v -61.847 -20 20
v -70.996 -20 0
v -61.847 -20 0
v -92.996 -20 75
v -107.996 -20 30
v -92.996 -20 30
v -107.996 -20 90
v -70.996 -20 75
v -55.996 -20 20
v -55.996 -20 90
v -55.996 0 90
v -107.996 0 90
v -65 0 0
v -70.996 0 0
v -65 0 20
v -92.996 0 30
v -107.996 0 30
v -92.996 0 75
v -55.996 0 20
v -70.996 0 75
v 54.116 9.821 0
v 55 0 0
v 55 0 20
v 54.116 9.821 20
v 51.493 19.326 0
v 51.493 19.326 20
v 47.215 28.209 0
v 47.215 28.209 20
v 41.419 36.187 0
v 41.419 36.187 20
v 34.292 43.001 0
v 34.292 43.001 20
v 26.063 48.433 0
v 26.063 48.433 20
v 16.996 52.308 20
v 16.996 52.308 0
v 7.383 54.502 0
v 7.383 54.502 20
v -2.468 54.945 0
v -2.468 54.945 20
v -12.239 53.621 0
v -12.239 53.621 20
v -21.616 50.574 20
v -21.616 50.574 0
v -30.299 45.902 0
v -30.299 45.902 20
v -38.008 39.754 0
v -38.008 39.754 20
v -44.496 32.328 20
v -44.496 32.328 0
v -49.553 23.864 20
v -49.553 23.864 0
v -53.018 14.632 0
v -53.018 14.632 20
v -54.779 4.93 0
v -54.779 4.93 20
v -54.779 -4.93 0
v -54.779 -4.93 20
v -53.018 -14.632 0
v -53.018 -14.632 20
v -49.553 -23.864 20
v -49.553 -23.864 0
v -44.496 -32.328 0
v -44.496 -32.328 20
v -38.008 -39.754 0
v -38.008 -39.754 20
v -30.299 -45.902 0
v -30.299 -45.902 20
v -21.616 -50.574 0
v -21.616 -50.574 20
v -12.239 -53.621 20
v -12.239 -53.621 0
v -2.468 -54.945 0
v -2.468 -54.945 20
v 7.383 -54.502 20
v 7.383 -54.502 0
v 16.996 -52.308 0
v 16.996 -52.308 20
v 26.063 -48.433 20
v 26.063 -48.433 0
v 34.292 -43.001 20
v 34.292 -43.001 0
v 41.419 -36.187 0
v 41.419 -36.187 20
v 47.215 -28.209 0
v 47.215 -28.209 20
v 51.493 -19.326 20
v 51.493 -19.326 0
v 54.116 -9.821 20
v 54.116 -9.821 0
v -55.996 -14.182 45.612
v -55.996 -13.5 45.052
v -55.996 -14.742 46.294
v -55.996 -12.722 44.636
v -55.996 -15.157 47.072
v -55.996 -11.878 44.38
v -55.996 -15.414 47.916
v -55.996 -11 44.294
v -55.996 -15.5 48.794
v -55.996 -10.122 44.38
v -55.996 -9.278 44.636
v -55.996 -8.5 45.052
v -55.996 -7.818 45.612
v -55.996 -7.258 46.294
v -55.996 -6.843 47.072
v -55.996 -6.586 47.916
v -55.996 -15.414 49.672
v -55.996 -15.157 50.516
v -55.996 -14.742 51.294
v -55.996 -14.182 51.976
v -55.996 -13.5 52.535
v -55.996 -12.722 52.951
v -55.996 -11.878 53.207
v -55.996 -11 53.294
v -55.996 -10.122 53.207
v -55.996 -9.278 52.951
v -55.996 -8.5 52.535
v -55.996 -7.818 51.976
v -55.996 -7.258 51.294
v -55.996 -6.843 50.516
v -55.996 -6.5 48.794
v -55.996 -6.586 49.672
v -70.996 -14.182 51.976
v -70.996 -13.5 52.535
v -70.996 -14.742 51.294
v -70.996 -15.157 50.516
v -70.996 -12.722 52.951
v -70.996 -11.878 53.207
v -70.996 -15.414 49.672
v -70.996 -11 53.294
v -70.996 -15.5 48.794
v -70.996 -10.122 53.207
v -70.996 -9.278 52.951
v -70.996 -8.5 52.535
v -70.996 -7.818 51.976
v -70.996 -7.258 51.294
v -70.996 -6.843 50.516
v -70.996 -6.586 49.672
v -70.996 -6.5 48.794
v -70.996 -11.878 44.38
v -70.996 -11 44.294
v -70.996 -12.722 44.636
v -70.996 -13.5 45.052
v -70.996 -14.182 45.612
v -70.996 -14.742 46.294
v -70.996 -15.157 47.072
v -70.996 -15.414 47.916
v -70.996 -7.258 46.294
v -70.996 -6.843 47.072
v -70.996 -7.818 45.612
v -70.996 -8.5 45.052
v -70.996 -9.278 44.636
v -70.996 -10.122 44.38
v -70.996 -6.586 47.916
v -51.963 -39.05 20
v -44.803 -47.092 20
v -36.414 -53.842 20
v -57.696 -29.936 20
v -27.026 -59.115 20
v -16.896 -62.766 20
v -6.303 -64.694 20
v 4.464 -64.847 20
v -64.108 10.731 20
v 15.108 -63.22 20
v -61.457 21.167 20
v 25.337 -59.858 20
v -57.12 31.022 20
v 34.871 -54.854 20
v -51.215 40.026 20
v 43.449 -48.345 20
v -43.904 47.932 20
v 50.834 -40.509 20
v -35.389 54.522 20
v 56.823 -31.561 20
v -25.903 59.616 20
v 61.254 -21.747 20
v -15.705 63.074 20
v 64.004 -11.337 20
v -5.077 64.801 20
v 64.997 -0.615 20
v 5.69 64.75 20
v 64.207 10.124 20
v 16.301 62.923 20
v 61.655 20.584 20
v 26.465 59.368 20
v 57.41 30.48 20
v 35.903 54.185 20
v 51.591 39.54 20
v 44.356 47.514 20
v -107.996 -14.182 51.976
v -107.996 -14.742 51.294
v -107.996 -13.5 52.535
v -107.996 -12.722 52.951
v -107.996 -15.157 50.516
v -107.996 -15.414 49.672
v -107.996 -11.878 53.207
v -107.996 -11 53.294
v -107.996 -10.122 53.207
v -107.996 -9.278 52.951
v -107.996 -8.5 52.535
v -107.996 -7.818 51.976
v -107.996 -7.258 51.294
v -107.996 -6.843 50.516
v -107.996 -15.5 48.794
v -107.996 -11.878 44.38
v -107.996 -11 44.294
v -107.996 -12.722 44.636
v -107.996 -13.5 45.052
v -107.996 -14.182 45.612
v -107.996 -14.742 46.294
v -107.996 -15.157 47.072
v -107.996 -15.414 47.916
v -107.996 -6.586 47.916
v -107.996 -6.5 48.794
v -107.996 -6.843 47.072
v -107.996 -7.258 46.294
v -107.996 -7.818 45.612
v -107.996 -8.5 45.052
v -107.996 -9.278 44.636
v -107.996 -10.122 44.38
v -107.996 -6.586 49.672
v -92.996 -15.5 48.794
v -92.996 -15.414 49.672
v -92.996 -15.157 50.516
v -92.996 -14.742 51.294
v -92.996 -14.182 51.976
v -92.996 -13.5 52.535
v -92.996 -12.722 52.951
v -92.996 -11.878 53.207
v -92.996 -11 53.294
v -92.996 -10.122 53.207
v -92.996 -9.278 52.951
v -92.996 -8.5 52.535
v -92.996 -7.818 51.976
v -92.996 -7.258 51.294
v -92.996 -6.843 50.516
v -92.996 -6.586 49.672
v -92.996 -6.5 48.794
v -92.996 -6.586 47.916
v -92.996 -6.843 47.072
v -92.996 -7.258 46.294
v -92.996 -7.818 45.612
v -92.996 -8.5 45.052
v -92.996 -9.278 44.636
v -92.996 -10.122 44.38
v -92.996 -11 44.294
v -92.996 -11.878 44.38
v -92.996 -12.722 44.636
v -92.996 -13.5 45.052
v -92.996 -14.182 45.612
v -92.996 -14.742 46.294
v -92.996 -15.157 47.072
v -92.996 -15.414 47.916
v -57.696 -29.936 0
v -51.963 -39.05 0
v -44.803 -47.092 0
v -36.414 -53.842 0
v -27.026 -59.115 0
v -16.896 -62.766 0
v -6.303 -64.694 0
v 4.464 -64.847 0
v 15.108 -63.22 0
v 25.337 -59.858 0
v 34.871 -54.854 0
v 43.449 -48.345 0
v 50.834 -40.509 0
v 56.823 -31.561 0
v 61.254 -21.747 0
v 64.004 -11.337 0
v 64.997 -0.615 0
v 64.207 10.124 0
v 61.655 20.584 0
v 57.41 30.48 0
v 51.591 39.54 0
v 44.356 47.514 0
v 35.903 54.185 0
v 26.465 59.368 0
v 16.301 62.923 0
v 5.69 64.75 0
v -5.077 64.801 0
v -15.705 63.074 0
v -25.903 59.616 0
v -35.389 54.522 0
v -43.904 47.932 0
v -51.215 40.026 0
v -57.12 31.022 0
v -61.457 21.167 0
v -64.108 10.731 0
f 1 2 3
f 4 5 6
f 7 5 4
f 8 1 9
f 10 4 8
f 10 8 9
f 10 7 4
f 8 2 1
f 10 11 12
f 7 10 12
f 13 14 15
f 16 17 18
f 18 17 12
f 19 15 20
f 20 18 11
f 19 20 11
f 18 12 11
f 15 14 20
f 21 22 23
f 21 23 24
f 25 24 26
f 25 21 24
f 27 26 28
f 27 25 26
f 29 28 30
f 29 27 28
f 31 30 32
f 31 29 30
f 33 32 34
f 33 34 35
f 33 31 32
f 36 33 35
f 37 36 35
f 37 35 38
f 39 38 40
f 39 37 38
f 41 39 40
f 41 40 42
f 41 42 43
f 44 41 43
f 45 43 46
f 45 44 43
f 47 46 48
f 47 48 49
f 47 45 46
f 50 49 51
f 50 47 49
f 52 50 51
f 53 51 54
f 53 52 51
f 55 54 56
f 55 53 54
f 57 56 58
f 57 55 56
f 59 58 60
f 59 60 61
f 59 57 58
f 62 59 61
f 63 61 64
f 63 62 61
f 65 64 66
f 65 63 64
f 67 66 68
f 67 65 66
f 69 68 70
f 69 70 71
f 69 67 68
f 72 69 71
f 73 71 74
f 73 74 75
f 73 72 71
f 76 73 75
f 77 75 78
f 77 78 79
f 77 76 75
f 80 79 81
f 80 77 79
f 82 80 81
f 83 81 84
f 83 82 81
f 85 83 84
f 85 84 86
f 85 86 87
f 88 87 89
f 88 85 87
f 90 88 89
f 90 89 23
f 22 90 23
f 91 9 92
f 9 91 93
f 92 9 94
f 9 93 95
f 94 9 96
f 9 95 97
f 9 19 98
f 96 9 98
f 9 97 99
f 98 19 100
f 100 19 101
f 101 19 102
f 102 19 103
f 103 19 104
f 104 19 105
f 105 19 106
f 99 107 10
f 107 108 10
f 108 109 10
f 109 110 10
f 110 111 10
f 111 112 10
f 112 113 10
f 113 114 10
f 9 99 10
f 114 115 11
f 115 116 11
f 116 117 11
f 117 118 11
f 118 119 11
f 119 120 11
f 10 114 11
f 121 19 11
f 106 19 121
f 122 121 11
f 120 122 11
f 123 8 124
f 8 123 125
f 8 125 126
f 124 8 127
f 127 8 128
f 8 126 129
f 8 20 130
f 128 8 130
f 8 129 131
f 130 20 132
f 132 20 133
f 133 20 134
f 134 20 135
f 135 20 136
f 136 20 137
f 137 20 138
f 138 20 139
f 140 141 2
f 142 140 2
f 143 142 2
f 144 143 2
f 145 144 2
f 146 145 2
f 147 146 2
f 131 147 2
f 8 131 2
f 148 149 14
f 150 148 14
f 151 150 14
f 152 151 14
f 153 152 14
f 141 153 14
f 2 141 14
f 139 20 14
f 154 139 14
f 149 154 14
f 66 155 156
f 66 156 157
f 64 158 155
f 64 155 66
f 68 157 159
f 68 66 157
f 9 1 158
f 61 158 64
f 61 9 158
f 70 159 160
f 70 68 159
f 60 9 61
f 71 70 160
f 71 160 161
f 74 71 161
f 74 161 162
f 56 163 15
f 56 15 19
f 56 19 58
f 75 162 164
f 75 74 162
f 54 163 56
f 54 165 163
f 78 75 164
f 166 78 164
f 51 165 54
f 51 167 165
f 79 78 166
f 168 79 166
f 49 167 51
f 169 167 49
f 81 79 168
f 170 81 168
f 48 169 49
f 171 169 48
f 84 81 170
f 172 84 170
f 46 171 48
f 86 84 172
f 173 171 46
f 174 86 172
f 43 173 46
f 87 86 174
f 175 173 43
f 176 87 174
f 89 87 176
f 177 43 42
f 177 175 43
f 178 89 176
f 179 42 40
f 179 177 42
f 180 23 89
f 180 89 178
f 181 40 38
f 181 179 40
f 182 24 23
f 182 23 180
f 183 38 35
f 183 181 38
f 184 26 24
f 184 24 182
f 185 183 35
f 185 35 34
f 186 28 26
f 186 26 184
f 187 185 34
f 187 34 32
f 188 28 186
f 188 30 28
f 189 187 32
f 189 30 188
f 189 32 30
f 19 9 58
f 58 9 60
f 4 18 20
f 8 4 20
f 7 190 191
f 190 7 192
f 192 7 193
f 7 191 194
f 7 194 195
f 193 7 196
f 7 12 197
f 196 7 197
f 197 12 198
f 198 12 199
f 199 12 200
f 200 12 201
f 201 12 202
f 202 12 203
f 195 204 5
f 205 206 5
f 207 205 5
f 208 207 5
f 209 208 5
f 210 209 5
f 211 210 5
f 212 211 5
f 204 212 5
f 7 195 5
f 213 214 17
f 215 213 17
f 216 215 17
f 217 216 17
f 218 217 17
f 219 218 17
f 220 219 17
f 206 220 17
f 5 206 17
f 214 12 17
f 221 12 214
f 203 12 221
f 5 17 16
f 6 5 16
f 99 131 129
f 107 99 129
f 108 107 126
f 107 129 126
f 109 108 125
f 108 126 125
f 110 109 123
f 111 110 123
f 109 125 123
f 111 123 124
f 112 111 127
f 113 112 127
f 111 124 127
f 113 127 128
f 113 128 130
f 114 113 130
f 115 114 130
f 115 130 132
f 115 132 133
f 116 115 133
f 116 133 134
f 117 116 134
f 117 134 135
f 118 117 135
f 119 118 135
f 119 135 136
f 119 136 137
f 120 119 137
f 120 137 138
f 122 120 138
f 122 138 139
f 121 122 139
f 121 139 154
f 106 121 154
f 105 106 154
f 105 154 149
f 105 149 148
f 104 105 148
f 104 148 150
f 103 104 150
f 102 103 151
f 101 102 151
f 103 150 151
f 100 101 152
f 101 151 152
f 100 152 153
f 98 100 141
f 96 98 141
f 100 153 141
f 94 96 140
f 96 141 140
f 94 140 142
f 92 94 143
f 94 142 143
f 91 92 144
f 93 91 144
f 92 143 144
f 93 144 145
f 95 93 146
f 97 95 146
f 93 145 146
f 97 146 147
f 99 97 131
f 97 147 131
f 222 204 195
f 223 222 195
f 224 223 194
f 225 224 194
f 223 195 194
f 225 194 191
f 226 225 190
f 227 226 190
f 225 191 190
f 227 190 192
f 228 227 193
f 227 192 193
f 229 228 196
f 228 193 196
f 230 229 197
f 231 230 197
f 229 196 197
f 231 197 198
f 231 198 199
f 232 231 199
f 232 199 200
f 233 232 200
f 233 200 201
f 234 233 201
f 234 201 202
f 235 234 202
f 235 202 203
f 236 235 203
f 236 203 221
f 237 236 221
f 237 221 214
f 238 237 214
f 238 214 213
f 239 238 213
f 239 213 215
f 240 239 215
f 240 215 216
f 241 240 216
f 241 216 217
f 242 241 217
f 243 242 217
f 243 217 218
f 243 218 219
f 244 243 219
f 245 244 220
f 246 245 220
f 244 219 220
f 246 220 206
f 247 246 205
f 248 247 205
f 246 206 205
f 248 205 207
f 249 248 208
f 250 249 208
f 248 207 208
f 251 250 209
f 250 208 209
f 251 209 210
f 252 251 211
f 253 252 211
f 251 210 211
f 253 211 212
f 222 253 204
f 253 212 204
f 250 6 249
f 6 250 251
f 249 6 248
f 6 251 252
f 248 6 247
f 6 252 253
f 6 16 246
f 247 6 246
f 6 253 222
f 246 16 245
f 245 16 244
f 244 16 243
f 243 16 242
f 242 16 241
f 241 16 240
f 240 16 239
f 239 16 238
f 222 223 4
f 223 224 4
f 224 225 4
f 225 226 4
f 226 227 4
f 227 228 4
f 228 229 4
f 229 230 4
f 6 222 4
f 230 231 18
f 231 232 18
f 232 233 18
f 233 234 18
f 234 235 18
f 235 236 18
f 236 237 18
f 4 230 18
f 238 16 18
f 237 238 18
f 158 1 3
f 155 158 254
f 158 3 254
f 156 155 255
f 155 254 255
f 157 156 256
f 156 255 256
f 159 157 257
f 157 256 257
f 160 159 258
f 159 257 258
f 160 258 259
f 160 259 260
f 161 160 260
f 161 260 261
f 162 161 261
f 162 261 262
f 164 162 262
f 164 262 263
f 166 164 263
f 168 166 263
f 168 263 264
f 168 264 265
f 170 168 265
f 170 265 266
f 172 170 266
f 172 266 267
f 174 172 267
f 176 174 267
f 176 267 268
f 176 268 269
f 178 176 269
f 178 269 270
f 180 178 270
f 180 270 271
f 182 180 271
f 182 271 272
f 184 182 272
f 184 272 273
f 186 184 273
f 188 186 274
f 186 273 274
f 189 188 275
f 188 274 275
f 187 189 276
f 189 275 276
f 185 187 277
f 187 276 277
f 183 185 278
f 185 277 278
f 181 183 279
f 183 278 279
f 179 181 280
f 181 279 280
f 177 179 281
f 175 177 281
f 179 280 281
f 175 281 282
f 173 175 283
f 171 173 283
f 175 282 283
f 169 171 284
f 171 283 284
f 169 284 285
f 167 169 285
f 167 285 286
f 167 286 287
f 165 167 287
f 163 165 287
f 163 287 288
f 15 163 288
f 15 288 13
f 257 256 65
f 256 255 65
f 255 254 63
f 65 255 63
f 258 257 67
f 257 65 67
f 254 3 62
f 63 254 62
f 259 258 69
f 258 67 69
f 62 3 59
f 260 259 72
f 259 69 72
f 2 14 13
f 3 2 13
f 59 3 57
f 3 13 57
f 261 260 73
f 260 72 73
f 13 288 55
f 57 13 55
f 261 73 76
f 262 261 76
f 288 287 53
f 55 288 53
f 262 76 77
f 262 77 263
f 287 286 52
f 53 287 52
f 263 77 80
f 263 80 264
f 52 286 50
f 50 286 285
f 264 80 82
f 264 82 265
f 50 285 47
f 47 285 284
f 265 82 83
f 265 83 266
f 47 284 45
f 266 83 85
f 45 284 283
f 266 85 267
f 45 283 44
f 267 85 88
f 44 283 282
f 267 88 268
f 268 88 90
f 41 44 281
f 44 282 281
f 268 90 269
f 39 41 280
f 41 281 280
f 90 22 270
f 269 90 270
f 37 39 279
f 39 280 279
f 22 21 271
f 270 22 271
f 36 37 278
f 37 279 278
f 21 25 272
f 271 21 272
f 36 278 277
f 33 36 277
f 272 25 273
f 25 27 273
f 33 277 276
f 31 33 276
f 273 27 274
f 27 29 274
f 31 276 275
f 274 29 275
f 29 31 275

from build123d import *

# Parameters (mm, degrees)
F0_R     = 65
F0_R_2   = 55
F1_DEPTH = 20
F3_DEPTH = 20
F4_R     = 4.5
F5_DEPTH = 172.996652


with BuildPart() as f1:
    # F0 (on Top) → F1 (new body)
    with BuildSketch(Plane.XY):
        Circle(F0_R)
        Circle(F0_R_2, mode=Mode.SUBTRACT)
    extrude(amount=F1_DEPTH)

    # F2 (on Front) → F3 (join)
    with BuildSketch(Plane.XZ):
        Polygon((-70.995652, 0), (-55.995652, 0), (-55.995652, 90), (-70.995652, 90), (-107.995652, 90), (-107.995652, 30), (-92.995652, 30), (-92.995652, 75), (-70.995652, 75), align=None)
    extrude(amount=F3_DEPTH)

    # F4 (on face) → F5 (cut, through all)
    with BuildSketch(Plane(origin=(-107.995652, 0, 0), x_dir=(0, -1, 0), z_dir=(-1, 0, 0))):
        with Locations((11, 48.7937)):
            Circle(F4_R)
    extrude(amount=-F5_DEPTH, mode=Mode.SUBTRACT)


solid = f1.part
